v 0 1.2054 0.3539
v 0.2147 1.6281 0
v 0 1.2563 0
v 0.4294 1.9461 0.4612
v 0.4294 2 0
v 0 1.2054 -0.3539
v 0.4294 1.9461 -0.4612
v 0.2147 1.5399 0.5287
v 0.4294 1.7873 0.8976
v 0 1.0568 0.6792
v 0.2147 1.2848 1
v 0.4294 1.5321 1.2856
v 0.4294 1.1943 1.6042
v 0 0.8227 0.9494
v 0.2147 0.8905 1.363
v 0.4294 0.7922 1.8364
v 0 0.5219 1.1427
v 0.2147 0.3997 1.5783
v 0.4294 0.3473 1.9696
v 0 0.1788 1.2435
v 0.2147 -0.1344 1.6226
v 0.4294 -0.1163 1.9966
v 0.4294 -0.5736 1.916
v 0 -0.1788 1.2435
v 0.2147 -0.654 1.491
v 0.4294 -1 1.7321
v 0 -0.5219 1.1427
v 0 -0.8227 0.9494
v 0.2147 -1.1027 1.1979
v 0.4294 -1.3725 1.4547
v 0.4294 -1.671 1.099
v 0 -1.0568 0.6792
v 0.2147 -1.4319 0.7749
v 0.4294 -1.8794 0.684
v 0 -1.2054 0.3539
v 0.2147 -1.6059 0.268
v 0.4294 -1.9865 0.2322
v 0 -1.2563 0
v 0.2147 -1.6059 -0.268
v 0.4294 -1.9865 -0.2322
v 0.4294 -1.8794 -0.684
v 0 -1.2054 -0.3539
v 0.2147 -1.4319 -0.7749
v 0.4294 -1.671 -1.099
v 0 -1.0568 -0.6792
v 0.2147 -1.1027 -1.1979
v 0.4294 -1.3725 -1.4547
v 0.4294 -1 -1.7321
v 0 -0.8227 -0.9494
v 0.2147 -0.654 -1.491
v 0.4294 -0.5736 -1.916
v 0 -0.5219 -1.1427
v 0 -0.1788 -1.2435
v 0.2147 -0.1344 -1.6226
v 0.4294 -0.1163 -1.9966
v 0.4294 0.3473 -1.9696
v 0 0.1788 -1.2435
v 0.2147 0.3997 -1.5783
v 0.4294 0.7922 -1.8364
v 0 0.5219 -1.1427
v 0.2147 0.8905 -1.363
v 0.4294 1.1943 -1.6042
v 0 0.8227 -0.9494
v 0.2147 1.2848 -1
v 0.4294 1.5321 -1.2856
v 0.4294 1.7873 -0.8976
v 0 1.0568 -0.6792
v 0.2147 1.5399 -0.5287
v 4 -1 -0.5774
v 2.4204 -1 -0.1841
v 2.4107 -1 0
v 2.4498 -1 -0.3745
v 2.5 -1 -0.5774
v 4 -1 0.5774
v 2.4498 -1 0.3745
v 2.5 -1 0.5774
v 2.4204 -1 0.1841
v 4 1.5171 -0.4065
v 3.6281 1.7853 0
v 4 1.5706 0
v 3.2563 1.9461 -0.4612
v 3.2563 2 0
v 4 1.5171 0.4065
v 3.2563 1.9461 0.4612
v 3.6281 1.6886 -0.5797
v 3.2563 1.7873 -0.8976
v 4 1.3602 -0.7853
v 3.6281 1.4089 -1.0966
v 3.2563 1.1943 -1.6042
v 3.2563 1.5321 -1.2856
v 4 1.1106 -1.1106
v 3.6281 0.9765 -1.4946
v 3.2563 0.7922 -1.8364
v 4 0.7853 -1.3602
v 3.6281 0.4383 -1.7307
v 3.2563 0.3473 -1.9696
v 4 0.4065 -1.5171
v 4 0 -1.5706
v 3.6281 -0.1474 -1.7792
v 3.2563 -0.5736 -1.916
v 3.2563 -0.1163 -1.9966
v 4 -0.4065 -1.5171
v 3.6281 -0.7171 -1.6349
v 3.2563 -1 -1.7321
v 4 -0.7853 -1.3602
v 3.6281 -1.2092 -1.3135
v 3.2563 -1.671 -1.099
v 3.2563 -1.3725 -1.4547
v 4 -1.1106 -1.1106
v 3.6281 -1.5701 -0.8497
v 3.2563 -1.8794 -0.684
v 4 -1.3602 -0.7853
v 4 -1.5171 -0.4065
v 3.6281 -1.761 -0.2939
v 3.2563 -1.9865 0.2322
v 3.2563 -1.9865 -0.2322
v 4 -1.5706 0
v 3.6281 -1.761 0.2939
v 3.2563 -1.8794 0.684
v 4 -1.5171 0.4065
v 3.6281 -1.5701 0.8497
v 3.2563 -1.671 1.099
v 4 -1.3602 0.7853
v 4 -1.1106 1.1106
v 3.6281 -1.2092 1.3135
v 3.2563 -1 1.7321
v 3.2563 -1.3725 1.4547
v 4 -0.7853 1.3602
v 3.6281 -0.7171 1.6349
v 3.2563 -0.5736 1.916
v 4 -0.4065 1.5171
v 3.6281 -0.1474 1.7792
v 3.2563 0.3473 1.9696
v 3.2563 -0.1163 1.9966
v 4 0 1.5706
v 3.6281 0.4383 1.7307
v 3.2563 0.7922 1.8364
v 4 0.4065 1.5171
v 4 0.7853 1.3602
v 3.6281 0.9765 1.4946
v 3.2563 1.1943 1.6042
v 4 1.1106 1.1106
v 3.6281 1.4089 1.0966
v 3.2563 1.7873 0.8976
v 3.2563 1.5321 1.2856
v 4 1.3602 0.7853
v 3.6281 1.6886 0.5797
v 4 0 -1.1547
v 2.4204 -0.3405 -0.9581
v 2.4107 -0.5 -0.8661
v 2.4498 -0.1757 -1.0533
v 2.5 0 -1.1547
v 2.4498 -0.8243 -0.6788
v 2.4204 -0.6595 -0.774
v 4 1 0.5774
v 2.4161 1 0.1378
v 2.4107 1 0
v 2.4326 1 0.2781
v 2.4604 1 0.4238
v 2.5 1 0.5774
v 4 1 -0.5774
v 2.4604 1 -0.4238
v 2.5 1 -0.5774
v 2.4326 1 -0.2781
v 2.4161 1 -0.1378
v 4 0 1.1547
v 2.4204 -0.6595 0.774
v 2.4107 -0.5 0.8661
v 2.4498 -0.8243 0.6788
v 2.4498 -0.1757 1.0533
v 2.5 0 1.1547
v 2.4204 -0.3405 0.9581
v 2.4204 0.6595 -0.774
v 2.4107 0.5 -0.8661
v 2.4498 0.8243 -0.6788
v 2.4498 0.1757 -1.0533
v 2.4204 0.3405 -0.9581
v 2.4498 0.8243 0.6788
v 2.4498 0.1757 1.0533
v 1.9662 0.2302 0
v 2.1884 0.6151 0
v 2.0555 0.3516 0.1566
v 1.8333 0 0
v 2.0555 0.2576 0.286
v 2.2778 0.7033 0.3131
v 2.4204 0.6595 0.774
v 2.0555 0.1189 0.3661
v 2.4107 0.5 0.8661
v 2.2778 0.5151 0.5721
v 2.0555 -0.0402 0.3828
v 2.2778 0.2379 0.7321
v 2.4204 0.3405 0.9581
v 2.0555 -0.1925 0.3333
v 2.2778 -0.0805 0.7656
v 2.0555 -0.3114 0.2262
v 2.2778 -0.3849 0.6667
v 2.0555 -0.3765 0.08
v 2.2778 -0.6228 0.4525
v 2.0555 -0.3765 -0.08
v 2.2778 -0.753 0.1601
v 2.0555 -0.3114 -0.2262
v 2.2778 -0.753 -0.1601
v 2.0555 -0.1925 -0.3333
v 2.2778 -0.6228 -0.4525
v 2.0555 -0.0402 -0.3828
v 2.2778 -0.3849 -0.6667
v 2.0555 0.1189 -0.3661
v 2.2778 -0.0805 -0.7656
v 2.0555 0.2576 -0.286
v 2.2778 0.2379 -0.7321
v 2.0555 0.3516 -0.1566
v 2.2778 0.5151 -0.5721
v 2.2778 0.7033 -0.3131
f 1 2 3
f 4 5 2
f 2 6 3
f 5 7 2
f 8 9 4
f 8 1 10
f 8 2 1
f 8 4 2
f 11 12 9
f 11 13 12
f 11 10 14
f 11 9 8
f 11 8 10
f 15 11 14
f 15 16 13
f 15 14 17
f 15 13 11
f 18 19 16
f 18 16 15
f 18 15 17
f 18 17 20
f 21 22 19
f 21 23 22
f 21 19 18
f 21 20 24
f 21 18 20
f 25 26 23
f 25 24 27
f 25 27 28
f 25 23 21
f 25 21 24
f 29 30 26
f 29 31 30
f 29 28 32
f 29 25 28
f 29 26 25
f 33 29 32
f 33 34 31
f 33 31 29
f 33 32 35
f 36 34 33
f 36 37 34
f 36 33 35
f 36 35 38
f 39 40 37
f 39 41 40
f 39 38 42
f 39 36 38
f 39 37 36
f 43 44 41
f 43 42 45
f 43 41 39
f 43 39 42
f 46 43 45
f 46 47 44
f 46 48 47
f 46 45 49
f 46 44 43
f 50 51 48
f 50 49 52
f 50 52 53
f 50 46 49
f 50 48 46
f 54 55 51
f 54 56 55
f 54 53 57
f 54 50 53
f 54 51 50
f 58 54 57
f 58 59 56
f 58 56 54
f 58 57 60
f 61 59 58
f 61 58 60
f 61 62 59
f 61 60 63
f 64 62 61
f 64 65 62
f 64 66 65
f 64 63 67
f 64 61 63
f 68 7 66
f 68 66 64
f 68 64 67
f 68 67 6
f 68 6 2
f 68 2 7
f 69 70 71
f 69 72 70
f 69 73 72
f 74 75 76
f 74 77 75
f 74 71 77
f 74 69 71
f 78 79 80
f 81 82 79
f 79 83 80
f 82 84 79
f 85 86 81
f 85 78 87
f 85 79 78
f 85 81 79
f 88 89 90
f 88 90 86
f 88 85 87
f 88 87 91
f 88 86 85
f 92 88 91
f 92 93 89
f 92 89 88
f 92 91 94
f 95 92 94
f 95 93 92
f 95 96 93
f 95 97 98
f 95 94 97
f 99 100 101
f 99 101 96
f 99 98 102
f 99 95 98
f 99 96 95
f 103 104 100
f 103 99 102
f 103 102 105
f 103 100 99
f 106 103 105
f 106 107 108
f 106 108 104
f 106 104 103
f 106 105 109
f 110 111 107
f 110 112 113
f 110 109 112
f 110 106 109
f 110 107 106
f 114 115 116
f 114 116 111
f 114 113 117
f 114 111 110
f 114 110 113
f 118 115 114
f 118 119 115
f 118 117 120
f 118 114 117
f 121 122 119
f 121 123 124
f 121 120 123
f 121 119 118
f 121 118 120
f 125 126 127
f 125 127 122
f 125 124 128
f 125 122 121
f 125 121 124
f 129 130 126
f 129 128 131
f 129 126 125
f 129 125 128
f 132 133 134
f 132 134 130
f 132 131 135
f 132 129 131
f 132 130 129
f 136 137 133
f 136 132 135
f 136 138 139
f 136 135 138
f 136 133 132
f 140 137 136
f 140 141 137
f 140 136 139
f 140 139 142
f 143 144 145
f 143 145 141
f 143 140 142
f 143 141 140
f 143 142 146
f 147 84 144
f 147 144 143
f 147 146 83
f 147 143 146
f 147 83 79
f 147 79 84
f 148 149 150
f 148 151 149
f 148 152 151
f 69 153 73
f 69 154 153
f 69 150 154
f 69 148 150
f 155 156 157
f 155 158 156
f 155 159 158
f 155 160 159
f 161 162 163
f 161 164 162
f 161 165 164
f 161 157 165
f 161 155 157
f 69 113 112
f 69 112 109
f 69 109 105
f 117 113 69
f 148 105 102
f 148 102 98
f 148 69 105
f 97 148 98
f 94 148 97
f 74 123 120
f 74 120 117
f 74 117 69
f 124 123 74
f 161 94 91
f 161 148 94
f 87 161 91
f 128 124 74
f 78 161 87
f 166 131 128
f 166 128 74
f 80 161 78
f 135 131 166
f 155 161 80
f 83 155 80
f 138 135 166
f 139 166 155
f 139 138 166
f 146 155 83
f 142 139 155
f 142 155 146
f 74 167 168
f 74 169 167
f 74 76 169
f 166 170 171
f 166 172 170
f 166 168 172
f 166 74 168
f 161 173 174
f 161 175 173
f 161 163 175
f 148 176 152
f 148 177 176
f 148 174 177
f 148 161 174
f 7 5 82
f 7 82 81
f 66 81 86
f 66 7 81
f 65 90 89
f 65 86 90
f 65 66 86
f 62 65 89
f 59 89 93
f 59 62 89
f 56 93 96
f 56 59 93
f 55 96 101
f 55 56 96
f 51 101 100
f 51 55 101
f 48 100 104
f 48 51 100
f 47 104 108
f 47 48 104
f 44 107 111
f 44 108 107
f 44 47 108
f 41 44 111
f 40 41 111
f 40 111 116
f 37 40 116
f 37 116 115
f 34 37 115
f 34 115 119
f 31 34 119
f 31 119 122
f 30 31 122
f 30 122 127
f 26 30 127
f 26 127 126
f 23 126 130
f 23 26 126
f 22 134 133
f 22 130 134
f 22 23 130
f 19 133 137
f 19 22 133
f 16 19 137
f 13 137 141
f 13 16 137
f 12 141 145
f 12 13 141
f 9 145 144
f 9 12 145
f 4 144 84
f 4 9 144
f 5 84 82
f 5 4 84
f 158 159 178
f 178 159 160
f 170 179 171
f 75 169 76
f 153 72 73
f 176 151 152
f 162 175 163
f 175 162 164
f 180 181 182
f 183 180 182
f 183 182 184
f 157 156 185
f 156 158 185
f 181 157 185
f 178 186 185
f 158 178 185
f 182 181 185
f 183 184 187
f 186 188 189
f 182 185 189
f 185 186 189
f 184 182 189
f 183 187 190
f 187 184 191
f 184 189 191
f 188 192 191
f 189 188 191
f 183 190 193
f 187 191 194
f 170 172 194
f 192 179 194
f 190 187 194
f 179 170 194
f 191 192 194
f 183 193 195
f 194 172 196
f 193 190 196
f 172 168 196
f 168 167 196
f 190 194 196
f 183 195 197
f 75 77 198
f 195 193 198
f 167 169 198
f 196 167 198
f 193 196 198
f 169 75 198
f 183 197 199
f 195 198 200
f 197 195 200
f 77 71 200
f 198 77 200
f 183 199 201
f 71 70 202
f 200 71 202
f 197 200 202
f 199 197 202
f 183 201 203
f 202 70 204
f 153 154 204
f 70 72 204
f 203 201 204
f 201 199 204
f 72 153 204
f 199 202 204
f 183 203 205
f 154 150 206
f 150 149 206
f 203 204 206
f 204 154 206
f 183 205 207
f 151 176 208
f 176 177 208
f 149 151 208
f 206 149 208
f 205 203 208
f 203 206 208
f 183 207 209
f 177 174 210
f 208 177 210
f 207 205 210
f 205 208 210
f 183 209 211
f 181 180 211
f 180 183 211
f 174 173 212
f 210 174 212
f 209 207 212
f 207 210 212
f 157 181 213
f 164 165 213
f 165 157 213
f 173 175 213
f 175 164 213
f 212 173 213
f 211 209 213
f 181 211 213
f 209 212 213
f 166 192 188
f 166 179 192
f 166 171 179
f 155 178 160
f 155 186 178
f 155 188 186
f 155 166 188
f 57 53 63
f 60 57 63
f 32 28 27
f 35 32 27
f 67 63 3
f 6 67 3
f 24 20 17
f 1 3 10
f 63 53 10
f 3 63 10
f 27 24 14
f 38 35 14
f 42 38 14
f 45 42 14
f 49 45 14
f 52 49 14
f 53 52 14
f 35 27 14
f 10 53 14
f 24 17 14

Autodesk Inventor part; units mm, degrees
ref_plane "YZ Plane" through (0, 0, 0) normal (1, 0, 0) x (0, 1, 0)
ref_plane "XZ Plane" through (0, 0, 0) normal (0, 1, 0) x (-1, 0, 0)
sketch "Sketch1" plane through (0, 0, 0) normal (0, 0, 1) x (1, 0, 0)
  line L0 (0, 0) -> (1.8333, 0)
  line L1 (4, 1.1547) -> (4, 2)
  line L2 (4, 2) -> (0, 2)
  line L3 (4, 1.1547) -> (2.5, 1.1547)
  line L4 (2.5, 1.1547) -> (1.8333, 0)
  line L5 (0, -0.4) -> (0, 2.4) projected
  line L6 (0, 2) -> (0, 0)
  dimension "d0" = 1.5
  dimension "d1" = 60
  dimension "d2" = 4
  dimension "d3" = 2.3094
  dimension "d5" = 4
revolve "Body" add sketch "Sketch1" angle 360 about axis through (0, 0, 0) along (1, 0, 0)
chamfer "Chamfer1" distance 0.4294 angle 60 1 edges at (4, -2, 0) measured on face at (4, 1.6877, -0.2517)
sketch "Sketch2" plane through (4, 0, 0) normal (1, 0, 0) x (0, 0, -1)
  circle A0 centre (0, 0) radius 1.1547 projected
  line L0 (-0.5774, 1) -> (0.5774, 1)
  line L1 (0.5774, 1) -> (1.1547, 0)
  line L2 (1.1547, 0) -> (0.5774, -1)
  line L3 (0.5774, -1) -> (-0.5774, -1)
  line L4 (-0.5774, -1) -> (-1.1547, 0)
  line L5 (-1.1547, 0) -> (-0.5774, 1)
extrude "Slot" add sketch "Sketch2" against normal up to next contours L1 A0 | A0 L2 | L0 A0 | A0 L3 | L5 A0 | A0 L4
thread "Thread" size "M4x0.7" class "6g" standard "ISO Metric profile" length 4
chamfer "Chamfer2" distance 0.4294 angle 60 1 edges at (0, -2, 0) measured on face at (1.0854, 1.9935, -0.1609)
ref_plane "Work Plane1" through (2, 0, 0) normal (0, 0.5, 0.866) x (1, 0, 0)
equation "\"d0\" = INTI"
equation "\"d2\" = NND"
equation "\"d3\" = 1.1547 * SW"
equation "\"d5\" = NLG"
equation "\"d7\" = -0.5 * GD1 + 0.5 * NND"
equation "\"d8\" = FAWI"
equation "\"d29\" = -0.5 * GD1 + 0.5 * NND"
equation "\"d11\" = NLG"
equation "\"d13\" = -0.5 * GD1 + 0.5 * NND"
equation "\"d14\" = FAWI"
equation "\"d30\" = -0.5 * GD1 + 0.5 * NND"
equation "\"NND\" = 4"
equation "\"NLG\" = 4"
equation "\"INTI\" = 1.5"
equation "\"FAWI\" = 60deg"
equation "\"SW\" = 2"
equation "\"GD1\" = THREADDIA - 1.2269 * PTC"
equation "\"FAWI1\" = 45deg"
equation "\"GUL\" = 0.61345 * PTC"
equation "\"SPD\" = 2.5"
equation "\"SEWI\" = 120deg"
equation "\"TOA\" = 30deg"
equation "\"THREADDIA\" = 4"
equation "\"PTC\" = 0.7"
equation "\"GAL\" = 0.61345 * PTC"
equation "\"E0\" = 1.155 * SW"
properties part number "ISO 4026 - M4 x 4" material "Stainless Steel, 440C"
